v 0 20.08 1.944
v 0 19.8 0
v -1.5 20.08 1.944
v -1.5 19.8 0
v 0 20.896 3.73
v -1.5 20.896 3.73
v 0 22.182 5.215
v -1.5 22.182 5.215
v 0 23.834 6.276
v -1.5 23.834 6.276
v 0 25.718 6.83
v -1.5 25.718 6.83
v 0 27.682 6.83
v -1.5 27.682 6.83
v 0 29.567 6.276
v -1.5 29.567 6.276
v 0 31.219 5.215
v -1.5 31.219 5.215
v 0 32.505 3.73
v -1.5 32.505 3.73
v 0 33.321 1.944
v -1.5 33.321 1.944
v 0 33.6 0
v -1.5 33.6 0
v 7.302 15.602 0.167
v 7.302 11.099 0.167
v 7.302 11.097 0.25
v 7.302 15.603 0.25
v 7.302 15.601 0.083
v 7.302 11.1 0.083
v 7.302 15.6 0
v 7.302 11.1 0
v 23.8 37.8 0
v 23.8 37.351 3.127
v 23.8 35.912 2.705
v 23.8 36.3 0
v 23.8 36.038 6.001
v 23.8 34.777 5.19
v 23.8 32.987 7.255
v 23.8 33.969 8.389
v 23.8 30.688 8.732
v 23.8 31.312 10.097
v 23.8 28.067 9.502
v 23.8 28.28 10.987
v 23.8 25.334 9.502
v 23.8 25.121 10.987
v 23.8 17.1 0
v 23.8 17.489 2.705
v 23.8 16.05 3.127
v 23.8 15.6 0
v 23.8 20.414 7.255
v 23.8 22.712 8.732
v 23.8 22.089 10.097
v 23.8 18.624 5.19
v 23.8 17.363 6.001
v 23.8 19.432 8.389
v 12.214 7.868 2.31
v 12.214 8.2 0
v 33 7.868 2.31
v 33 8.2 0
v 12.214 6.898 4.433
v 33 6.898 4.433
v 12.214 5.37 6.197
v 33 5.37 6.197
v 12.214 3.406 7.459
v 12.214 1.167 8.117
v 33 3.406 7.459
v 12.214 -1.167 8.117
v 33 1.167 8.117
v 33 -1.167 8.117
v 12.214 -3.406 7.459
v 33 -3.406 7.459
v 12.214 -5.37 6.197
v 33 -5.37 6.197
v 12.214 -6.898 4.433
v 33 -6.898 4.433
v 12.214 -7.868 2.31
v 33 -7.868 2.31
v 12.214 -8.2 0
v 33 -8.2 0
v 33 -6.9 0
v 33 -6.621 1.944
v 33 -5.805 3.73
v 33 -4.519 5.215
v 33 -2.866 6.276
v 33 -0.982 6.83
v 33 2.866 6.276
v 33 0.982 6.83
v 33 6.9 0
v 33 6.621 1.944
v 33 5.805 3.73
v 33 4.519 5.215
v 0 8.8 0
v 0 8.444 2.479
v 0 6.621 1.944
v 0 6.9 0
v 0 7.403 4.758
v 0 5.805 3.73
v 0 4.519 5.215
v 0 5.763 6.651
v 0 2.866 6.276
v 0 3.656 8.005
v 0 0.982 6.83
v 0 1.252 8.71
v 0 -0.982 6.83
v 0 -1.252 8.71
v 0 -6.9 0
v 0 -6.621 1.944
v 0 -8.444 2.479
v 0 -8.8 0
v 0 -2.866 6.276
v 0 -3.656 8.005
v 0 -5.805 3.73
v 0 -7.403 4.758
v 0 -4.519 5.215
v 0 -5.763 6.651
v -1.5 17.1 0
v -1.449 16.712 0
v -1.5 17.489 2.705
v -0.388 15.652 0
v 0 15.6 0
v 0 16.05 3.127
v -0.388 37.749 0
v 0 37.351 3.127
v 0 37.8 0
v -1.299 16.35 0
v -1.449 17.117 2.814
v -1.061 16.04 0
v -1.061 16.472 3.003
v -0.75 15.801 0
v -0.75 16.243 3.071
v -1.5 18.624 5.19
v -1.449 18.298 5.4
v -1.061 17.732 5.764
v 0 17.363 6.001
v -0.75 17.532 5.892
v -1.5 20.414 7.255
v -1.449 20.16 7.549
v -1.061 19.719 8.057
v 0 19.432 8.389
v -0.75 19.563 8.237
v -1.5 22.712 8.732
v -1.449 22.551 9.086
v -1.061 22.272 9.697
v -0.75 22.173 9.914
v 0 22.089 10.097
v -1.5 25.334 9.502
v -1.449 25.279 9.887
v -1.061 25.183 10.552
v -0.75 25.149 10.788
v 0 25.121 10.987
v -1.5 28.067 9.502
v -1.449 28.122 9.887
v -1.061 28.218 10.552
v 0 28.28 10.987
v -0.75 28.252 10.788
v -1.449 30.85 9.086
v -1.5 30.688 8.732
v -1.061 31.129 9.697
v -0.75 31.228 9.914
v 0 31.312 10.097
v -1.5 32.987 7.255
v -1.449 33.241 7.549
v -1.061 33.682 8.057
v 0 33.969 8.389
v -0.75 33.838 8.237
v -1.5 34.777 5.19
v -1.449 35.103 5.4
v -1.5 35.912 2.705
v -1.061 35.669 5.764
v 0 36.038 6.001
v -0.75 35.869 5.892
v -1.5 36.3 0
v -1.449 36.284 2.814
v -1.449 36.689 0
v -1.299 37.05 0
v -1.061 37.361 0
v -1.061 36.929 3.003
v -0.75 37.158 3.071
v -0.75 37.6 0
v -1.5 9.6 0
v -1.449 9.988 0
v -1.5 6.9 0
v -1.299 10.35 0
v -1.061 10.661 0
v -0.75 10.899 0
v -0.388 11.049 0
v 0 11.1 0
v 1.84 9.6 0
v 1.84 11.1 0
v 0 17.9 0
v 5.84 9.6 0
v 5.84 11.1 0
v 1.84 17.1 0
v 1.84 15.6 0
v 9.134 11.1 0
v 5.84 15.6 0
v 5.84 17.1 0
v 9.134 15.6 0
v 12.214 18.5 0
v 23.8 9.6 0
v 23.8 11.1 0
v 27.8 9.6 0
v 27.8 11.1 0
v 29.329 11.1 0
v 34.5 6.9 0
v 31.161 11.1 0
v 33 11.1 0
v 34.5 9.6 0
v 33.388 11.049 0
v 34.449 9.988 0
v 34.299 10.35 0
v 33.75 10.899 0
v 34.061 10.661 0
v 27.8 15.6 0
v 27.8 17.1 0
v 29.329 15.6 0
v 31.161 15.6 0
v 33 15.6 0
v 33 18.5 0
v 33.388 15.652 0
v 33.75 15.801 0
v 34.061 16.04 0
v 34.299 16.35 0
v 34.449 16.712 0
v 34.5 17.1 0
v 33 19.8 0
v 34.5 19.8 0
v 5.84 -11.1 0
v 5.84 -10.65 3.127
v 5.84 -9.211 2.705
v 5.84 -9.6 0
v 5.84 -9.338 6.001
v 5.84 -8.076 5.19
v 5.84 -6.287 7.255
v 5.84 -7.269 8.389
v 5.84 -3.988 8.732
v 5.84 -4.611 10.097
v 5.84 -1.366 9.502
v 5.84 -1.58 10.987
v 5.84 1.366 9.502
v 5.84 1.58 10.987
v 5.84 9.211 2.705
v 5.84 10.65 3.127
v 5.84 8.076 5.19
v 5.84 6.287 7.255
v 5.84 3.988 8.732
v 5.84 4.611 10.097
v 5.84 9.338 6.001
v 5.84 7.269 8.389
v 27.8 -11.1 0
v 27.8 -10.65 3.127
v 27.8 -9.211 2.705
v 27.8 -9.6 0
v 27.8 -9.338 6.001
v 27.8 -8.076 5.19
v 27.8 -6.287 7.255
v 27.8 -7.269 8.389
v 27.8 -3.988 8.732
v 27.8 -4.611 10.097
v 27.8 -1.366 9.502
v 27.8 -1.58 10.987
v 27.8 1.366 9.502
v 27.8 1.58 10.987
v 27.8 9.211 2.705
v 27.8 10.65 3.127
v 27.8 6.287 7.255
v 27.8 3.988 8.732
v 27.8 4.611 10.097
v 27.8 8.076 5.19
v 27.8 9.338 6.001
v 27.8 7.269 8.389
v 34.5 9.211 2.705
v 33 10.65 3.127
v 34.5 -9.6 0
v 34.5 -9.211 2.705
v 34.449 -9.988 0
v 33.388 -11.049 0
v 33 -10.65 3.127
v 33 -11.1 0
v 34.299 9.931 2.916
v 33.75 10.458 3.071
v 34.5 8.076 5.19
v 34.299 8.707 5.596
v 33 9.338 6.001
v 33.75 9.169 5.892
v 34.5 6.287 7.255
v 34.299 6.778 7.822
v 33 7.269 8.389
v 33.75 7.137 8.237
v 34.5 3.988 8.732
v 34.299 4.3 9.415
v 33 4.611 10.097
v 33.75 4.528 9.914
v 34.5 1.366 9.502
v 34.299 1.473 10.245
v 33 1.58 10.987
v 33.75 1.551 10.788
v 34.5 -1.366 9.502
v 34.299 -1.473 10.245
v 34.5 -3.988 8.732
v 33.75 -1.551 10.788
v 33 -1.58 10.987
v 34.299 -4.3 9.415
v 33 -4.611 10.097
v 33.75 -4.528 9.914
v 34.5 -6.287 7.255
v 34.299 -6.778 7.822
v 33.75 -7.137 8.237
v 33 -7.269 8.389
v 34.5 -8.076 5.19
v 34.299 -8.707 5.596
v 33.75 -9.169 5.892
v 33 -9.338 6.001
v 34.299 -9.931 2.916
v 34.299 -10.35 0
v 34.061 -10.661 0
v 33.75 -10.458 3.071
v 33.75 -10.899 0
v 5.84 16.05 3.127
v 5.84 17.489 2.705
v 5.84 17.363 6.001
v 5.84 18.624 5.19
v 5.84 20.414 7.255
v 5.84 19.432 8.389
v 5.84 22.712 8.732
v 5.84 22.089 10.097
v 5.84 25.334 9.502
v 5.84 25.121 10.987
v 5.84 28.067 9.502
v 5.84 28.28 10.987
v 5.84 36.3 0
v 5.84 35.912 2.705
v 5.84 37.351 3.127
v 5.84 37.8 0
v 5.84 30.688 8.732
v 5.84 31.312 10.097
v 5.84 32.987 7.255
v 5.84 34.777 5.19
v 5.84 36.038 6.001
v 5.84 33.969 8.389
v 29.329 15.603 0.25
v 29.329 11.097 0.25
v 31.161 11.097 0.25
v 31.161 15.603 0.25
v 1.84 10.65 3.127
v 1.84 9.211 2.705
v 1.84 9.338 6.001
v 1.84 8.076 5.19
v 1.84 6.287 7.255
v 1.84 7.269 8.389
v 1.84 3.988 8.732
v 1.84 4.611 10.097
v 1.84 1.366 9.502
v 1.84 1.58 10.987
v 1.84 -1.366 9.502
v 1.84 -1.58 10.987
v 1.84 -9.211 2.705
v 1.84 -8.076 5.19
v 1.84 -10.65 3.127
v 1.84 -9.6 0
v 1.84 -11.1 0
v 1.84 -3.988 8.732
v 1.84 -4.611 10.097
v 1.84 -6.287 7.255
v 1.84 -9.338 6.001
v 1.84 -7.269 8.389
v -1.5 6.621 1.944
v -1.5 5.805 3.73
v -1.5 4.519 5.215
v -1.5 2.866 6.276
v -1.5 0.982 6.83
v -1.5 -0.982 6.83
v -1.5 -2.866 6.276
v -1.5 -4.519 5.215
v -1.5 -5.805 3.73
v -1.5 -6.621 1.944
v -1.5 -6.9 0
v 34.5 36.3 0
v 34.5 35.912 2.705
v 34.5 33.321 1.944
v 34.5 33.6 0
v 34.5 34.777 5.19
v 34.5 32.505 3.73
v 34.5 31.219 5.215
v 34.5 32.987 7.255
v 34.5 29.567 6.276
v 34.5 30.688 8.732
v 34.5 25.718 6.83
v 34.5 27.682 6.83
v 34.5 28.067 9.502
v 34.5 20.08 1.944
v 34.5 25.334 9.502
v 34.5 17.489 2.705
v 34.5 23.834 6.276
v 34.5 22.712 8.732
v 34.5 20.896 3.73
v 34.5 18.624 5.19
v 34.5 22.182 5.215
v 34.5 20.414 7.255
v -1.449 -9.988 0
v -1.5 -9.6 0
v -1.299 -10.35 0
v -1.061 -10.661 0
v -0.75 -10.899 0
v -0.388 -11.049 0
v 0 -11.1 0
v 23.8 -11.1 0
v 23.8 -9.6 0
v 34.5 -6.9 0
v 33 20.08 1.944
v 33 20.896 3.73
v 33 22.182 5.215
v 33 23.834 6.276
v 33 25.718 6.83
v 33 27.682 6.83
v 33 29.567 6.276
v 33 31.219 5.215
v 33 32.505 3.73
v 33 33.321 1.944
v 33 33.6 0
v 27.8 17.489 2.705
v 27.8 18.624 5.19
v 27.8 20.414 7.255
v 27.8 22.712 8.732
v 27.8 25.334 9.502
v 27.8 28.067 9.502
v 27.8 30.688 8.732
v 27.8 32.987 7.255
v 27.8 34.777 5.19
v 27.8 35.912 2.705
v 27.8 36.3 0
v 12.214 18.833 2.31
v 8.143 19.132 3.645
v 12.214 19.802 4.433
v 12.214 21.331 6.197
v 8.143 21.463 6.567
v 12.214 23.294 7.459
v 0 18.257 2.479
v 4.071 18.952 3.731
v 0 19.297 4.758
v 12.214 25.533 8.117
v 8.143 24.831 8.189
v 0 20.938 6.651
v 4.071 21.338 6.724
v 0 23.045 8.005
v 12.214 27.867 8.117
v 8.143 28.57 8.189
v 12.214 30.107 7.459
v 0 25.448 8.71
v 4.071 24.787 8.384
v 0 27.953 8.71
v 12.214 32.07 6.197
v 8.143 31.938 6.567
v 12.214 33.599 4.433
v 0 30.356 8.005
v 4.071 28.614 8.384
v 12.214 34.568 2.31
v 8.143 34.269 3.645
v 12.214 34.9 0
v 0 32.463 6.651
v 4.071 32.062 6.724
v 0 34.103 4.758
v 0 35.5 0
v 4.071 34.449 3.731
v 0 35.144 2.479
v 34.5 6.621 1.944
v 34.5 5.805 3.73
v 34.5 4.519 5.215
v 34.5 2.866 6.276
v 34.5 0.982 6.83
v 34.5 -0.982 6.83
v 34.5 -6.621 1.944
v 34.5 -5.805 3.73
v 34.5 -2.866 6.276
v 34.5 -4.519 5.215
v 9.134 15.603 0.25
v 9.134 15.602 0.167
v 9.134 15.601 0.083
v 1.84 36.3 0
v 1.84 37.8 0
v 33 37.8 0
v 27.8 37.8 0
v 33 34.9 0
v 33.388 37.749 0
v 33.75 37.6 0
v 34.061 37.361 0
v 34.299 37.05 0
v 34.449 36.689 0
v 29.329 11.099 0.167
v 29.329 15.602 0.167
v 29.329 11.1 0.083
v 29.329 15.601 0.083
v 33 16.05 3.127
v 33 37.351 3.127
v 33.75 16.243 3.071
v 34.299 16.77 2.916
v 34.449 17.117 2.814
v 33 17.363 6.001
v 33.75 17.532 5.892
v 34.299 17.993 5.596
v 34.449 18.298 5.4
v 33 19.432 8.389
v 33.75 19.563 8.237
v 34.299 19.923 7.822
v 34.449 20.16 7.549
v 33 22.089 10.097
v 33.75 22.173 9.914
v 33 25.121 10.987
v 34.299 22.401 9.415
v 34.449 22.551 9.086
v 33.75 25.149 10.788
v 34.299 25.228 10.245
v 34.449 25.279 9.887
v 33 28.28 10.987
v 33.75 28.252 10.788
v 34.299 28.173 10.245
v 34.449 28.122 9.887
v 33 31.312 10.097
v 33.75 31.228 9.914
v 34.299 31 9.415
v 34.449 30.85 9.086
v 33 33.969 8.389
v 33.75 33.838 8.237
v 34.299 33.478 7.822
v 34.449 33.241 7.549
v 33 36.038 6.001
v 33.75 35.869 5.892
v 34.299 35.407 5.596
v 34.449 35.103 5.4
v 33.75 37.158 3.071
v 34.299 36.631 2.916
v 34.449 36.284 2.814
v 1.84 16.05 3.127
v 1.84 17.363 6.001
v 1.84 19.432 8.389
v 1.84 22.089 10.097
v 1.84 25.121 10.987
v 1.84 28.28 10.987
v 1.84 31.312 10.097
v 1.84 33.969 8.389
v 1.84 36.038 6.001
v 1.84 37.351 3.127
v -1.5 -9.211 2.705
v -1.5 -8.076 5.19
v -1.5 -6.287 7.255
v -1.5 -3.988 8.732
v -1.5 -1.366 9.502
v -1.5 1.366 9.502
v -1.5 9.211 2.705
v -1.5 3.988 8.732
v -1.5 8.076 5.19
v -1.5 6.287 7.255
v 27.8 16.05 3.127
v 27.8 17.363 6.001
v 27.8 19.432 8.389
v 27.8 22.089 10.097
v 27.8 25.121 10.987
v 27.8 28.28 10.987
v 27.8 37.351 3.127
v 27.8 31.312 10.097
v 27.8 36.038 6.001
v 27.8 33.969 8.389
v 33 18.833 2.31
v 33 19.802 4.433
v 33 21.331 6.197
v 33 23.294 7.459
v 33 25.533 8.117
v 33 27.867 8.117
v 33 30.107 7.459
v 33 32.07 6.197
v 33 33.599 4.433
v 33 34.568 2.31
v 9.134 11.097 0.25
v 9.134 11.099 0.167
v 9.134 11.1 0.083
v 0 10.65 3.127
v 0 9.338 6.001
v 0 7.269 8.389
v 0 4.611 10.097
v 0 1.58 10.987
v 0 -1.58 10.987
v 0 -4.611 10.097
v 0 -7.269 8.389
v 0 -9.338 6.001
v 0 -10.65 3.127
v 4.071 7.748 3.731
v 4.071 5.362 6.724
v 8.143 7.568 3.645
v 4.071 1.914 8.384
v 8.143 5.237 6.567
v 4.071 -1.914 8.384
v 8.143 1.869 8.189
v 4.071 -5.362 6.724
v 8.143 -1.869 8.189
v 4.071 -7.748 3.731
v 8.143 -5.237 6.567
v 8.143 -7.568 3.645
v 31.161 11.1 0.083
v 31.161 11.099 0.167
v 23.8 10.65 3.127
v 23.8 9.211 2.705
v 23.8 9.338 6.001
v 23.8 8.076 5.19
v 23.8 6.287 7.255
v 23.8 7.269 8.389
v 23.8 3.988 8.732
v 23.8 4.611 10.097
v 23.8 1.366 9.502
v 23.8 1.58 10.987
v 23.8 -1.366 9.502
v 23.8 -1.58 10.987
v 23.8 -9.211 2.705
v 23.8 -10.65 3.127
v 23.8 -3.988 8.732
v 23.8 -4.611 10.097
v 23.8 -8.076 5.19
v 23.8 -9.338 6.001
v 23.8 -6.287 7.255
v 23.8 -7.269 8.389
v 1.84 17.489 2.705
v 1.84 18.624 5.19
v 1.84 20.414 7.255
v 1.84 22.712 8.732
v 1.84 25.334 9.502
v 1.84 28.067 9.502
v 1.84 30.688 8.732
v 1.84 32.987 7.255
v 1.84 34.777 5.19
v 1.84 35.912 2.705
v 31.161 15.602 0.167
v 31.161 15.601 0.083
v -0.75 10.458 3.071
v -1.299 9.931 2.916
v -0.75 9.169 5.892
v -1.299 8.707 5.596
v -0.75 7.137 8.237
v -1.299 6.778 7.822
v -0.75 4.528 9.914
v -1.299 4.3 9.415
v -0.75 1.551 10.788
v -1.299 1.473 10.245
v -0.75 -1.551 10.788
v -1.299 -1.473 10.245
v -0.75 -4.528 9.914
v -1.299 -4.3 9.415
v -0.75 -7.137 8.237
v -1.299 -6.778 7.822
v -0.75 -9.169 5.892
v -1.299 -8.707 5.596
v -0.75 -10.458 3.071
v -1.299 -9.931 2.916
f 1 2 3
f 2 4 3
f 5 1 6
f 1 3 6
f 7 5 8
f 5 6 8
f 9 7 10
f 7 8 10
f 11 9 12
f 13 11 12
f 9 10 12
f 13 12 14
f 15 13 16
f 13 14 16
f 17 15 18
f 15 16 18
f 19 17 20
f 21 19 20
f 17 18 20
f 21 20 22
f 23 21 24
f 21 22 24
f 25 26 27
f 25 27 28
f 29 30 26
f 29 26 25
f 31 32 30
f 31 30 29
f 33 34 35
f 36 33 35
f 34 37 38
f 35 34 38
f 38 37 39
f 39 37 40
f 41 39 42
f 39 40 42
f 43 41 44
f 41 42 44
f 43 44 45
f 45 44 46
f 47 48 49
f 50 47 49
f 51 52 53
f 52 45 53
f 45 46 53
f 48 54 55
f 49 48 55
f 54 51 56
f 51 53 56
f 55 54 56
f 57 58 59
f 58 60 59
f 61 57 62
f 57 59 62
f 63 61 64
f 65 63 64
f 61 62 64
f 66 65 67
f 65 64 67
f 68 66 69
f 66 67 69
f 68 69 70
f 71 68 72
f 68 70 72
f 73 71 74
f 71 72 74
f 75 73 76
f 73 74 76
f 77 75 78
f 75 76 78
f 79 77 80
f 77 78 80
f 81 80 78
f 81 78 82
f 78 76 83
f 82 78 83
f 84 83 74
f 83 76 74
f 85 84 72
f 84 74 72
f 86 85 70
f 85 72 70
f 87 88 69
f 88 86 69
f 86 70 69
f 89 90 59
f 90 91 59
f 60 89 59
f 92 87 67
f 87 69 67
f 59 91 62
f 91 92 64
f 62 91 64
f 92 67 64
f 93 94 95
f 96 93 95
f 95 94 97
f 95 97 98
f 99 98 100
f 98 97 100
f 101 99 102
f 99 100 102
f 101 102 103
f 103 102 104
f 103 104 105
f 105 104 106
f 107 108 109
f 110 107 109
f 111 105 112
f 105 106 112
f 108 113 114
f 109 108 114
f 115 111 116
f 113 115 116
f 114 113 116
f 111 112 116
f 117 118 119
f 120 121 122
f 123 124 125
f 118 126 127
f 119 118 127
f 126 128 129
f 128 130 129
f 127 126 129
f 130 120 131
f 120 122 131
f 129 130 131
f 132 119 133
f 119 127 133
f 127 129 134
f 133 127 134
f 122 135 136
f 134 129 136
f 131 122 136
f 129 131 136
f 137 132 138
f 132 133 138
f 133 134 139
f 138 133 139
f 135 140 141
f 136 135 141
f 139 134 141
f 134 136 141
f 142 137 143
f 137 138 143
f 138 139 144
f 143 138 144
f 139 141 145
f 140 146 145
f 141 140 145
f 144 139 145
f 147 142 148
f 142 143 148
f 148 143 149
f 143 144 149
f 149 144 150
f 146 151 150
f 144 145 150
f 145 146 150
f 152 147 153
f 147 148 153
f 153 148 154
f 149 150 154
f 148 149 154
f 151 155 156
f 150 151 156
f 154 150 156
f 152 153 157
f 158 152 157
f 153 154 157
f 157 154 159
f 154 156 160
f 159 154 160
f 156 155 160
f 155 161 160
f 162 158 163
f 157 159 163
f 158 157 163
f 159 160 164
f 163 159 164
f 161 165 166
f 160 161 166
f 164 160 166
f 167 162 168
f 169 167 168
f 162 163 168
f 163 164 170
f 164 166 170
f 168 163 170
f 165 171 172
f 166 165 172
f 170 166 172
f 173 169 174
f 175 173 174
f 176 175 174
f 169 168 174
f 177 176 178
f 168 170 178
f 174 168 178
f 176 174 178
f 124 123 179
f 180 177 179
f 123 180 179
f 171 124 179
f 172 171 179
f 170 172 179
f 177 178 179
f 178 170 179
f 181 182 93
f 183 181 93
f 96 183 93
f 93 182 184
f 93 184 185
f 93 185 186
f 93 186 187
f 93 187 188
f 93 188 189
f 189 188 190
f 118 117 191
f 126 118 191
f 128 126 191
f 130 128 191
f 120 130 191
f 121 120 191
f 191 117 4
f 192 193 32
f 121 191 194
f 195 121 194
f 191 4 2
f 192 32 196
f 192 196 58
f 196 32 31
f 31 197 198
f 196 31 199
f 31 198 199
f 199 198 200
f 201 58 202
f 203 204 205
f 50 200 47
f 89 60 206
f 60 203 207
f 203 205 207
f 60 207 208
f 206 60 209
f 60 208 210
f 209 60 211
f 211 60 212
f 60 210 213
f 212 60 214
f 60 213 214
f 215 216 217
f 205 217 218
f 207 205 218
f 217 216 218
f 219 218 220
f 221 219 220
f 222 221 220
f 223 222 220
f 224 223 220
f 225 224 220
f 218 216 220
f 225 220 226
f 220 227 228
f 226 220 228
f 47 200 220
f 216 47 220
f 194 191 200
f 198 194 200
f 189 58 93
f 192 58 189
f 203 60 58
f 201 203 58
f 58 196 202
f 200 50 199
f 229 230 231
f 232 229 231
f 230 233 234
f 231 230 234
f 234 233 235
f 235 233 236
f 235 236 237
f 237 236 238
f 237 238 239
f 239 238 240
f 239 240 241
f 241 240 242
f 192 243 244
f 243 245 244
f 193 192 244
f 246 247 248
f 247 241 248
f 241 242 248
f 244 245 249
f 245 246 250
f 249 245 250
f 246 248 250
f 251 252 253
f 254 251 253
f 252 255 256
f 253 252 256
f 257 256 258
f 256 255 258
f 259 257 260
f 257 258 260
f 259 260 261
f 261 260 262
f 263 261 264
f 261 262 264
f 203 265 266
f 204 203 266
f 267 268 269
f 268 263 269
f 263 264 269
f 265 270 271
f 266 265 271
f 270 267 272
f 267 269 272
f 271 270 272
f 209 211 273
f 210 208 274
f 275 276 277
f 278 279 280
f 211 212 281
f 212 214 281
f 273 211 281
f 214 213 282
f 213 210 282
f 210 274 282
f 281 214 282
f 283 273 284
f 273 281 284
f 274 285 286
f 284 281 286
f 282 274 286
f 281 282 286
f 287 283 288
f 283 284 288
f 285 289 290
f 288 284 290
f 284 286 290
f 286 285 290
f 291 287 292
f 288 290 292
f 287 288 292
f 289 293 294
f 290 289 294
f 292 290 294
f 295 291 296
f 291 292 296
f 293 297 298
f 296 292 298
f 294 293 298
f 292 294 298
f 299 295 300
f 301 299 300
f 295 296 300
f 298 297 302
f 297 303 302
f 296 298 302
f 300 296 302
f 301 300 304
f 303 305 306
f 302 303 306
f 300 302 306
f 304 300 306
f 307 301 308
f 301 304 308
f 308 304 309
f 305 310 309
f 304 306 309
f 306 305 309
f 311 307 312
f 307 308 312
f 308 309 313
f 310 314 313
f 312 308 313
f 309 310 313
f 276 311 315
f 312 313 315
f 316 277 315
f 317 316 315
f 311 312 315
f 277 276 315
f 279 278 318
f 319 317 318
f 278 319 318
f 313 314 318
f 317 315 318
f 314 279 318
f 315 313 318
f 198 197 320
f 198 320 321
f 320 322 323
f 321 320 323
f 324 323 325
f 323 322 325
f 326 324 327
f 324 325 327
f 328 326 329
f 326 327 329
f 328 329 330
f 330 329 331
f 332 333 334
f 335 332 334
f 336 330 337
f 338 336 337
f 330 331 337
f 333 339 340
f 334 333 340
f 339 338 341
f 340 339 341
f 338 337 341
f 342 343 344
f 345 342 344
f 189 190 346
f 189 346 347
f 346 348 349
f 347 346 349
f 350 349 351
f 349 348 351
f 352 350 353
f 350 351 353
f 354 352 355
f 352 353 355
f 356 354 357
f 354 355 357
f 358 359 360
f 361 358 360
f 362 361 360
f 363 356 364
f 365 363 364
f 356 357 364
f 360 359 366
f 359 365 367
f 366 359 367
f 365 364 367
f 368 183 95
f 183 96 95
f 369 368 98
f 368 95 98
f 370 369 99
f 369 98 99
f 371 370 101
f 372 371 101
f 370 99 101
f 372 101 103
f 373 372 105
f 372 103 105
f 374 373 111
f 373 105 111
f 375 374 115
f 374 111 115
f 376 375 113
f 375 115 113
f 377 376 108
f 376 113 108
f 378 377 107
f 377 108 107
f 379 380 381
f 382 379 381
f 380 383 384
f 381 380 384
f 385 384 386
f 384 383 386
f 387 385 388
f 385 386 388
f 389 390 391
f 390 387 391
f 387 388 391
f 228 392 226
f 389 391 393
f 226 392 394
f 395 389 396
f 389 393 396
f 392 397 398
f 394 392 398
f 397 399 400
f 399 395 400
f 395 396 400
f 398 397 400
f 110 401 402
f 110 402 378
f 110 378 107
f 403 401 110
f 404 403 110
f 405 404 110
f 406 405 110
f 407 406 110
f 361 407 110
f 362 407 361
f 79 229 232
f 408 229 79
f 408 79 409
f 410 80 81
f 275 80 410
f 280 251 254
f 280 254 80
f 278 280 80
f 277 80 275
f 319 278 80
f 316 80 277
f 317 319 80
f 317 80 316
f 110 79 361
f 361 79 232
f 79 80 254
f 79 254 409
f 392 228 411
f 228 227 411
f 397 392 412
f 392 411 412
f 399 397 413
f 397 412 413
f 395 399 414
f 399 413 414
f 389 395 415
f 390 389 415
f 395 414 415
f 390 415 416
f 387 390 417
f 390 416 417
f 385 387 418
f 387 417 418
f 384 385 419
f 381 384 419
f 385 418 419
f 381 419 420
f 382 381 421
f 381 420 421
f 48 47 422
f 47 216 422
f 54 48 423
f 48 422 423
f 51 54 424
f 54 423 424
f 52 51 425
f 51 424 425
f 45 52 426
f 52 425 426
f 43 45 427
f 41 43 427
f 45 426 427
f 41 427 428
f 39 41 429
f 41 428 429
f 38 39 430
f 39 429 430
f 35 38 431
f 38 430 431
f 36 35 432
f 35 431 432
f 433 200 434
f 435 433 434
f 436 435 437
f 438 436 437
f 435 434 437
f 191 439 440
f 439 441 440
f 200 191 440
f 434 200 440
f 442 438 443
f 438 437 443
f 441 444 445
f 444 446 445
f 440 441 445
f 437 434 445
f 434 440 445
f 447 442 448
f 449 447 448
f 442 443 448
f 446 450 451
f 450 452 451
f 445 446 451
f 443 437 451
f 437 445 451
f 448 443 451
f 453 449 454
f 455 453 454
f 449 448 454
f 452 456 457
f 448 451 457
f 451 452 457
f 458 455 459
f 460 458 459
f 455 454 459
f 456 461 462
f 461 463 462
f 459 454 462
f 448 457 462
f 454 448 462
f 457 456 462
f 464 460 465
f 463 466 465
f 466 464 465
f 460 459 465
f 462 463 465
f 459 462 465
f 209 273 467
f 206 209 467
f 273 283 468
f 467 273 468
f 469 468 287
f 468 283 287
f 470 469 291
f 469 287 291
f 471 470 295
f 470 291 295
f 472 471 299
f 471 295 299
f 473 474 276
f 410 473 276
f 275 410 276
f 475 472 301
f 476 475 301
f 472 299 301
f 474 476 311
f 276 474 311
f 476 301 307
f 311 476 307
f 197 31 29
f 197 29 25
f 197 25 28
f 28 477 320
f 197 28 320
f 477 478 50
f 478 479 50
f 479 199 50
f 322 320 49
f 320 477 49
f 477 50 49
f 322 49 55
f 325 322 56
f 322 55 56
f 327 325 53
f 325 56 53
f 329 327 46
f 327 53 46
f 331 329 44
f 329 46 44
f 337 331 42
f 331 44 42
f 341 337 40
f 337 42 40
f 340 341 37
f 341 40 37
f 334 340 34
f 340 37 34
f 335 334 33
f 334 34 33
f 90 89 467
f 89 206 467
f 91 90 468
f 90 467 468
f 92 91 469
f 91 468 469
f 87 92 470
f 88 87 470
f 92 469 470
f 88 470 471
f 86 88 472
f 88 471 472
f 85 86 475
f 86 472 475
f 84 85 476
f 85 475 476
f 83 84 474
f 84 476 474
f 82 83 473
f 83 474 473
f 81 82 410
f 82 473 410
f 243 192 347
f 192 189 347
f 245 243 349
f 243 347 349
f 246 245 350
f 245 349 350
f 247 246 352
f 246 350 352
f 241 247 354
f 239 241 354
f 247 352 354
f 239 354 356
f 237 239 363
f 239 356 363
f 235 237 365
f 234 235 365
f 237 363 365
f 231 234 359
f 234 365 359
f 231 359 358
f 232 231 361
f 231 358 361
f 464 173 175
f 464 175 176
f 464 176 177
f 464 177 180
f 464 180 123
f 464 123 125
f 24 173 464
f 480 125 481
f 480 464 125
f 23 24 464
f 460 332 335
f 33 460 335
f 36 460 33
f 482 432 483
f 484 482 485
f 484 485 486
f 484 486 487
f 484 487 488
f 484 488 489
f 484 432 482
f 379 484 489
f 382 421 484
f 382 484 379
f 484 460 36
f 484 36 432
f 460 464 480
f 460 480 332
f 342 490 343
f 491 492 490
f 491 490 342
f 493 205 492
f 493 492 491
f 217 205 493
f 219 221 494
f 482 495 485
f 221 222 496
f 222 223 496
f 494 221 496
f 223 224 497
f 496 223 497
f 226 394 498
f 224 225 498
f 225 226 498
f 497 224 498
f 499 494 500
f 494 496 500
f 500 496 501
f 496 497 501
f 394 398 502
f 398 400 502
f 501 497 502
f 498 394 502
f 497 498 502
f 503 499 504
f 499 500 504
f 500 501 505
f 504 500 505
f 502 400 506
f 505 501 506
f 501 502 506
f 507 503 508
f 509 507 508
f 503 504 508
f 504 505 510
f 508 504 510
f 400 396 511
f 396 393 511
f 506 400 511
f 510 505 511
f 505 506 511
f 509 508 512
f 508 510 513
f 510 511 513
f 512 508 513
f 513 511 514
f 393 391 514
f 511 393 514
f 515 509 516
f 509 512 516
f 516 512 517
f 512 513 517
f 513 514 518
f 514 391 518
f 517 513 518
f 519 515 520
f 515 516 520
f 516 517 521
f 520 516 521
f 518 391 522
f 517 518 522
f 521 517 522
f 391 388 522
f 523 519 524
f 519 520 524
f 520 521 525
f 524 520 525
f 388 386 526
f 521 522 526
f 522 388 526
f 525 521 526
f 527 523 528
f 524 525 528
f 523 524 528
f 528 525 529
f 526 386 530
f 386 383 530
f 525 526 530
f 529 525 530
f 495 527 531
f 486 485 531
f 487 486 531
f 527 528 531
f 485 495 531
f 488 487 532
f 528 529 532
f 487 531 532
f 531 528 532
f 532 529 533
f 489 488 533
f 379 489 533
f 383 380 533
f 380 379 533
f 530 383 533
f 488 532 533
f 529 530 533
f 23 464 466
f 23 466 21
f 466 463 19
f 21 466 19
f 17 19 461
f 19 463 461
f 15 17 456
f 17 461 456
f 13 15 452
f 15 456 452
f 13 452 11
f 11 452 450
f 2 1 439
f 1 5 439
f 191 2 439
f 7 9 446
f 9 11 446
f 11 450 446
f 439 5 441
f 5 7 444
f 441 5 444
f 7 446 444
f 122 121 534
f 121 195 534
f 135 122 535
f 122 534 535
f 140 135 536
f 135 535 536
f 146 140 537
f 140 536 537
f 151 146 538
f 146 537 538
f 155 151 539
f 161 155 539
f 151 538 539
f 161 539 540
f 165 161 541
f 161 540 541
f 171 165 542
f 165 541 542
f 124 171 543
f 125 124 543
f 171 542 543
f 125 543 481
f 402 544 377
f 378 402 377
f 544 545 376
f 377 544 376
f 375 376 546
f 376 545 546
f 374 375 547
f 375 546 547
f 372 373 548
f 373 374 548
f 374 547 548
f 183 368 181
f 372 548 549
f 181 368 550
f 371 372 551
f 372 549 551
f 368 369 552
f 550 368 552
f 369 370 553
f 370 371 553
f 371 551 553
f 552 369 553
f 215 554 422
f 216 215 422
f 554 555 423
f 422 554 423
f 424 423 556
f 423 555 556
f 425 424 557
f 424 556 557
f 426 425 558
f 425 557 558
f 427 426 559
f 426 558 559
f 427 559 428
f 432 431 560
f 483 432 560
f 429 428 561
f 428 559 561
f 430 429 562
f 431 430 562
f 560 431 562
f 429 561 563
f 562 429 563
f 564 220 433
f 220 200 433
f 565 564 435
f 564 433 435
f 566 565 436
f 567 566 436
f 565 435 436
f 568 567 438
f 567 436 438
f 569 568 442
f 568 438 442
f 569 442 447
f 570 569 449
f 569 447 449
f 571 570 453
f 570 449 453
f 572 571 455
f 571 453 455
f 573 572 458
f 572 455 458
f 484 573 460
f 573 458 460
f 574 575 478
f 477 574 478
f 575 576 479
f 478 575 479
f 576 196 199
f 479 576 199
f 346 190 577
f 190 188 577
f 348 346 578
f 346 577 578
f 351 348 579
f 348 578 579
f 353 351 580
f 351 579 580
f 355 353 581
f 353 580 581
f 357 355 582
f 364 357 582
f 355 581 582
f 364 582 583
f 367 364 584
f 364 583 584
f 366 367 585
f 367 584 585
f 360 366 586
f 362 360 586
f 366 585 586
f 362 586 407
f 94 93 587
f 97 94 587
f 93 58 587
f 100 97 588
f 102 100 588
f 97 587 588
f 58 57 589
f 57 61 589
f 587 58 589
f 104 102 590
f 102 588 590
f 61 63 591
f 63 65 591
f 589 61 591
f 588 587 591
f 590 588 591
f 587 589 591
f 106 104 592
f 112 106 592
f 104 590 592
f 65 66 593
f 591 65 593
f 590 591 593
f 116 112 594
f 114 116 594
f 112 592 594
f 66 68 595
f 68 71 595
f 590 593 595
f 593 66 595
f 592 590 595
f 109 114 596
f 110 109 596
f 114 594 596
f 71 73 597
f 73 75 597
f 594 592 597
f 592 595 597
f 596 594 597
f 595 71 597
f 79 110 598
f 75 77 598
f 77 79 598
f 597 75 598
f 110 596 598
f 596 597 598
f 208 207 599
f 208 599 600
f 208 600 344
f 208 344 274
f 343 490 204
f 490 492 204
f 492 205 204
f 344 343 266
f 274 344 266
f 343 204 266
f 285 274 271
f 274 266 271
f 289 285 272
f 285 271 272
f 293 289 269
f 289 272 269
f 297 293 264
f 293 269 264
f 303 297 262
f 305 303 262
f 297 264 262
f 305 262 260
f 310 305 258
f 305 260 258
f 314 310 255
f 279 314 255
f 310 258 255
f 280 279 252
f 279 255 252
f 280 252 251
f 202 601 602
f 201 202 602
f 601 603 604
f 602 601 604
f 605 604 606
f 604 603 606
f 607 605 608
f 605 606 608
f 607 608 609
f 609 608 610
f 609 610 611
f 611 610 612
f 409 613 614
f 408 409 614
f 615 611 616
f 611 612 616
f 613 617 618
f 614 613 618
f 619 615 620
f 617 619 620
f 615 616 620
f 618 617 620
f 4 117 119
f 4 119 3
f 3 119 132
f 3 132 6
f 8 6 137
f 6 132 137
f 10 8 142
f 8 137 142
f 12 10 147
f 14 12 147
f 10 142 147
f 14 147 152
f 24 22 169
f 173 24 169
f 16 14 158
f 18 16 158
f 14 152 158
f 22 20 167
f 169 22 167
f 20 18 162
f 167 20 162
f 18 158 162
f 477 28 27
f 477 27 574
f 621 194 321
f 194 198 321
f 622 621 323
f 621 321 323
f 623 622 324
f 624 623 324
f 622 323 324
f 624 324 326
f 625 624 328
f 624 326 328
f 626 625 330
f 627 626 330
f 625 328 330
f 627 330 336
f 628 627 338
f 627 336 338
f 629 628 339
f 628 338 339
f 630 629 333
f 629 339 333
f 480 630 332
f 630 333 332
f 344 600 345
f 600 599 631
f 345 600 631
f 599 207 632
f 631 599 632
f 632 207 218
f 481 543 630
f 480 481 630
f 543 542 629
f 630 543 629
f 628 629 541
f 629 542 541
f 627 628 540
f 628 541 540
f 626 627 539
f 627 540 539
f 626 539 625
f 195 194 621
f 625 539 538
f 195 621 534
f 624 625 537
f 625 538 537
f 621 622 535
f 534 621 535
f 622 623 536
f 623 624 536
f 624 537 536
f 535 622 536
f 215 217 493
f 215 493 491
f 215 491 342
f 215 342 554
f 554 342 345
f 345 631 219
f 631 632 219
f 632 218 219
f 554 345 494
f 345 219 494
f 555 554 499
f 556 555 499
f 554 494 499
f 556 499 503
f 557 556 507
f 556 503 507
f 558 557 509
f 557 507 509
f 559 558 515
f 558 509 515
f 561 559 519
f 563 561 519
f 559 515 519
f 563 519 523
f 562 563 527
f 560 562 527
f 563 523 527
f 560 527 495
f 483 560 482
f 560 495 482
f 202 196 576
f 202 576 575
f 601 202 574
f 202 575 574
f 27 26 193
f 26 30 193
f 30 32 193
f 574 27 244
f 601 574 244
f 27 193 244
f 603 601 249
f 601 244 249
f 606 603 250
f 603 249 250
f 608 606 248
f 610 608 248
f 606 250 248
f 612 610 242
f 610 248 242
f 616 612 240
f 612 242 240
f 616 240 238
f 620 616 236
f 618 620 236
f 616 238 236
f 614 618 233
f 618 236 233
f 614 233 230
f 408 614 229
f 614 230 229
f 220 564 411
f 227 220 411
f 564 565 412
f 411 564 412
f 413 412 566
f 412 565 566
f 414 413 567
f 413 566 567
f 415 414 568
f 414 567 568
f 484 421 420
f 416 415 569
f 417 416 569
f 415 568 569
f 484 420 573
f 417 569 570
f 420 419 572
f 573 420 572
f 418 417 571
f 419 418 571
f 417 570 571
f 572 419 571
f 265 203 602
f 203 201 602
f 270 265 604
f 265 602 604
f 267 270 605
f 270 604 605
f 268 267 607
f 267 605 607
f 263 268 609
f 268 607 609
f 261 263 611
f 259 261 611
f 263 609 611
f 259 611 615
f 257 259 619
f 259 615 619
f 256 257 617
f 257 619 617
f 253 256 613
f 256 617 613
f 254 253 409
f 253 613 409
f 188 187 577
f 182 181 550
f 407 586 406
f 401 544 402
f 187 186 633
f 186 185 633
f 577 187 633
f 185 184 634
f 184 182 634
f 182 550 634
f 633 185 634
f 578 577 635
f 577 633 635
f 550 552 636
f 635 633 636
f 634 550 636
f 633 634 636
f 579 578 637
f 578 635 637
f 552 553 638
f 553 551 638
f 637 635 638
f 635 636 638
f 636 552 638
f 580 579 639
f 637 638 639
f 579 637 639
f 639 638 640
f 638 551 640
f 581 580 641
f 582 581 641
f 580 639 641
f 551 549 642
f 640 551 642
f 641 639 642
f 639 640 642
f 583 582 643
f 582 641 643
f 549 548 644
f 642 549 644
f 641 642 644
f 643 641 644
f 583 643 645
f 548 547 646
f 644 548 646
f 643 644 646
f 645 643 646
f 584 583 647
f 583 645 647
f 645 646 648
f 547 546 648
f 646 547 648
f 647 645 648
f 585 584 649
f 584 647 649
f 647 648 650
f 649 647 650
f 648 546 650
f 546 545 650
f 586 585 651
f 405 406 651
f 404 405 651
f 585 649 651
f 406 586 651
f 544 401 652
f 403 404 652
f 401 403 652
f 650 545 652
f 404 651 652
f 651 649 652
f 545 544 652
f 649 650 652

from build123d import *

# Parameters (mm, degrees)
F2_ANGLE = 180
F3_ANGLE = 180
F1_W     = 1.8325150013
F1_H     = 5.3774006665
F1_W_2   = 1.83251407
F1_H_2   = 5.3300224245
F4_DEPTH = 0.25


# Not quite as in the source:
# - ends of sketch curves that miss each other by under 0.0002 mm in the source are joined
# - a feature names something its author has since deleted; it is built from what else it names


with BuildPart() as f2:
    # F0 (on Top) → F2 (revolve)
    with BuildSketch(Plane.XY):
        with BuildLine():
            Line((34.5, 8.2), (34.5, 9.6))
            ThreePointArc((34.5, 9.6), (34.0606601718, 10.6606601718), (33, 11.1))
            Line((33, 11.1), (27.8003929108, 11.1000006409))
            Line((27.8003929108, 11.1000006409), (27.8003929108, 9.600000456))
            Line((27.8003929108, 9.600000456), (23.8003929108, 9.600000456))
            Line((23.8003929108, 9.600000456), (23.8003929108, 11.100000456))
            Line((23.8003929108, 11.100000456), (5.8400444046, 11.0999997705))
            Line((5.8400444046, 11.0999997705), (5.8400444046, 9.6))
            Line((5.8400444046, 9.6), (1.8400444046, 9.6))
            Line((1.8400444046, 9.6), (1.8400444046, 11.1))
            Line((1.8400444046, 11.1), (0, 11.1))
            ThreePointArc((0, 11.1), (-1.0606601718, 10.6606601718), (-1.5, 9.6))
            Line((-1.5, 9.6), (-1.5, 6.9))
            Line((-1.5, 6.9), (0, 6.9))
            Line((0, 6.9), (0, 8.8))
            Line((0, 8.8), (12.2141037136, 8.2))
            Line((12.2141037136, 8.2), (33, 8.2))
            Line((33, 8.2), (33, 6.9))
            Line((33, 6.9), (34.5, 6.9))
            Line((34.5, 6.9), (34.5, 8.2))
        make_face()
    revolve(axis=Axis((17.25, 0, 0), (1, 0, 0)), revolution_arc=F2_ANGLE)



with BuildPart() as f3:
    # F0 (on Top) → F3 (revolve)
    with BuildSketch(Plane.XY):
        with BuildLine():
            Line((34.5, 17.1004687339), (34.5, 18.5004687339))
            Line((34.5, 18.5004687339), (34.5, 19.8004687339))
            Line((34.5, 19.8004687339), (33, 19.8004687339))
            Line((33, 19.8004687339), (33, 18.5004687339))
            Line((33, 18.5004687339), (12.2141037136, 18.5004687339))
            Line((12.2141037136, 18.5004687339), (0, 17.9004687339))
            Line((0, 17.9004687339), (0, 19.8004687339))
            Line((0, 19.8004687339), (-1.5, 19.8004687339))
            Line((-1.5, 19.8004687339), (-1.5, 17.1004687339))
            ThreePointArc((-1.5, 17.1004687339), (-1.0606601718, 16.0398085621), (0, 15.6004687339))
            Line((0, 15.6004687339), (1.8400444046, 15.6004687339))
            Line((1.8400444046, 15.6004687339), (1.8400444046, 17.1004687339))
            Line((1.8400444046, 17.1004687339), (5.8400444046, 17.1004687339))
            Line((5.8400444046, 17.1004687339), (5.8400444046, 15.6004687339))
            Line((5.8400444046, 15.6004687339), (23.8003929108, 15.6004682779))
            Line((23.8003929108, 15.6004682779), (23.8003929108, 17.1004682779))
            Line((23.8003929108, 17.1004682779), (27.8003929108, 17.1004682779))
            Line((27.8003929108, 17.1004682779), (27.8003929108, 15.6004680931))
            Line((27.8003929108, 15.6004680931), (33, 15.6004687339))
            ThreePointArc((33, 15.6004687339), (34.0606601718, 16.0398085621), (34.5, 17.1004687339))
        make_face()
    revolve(axis=Axis((17.25, 26.7004687339, 0), (-1, 0, 0)), revolution_arc=F3_ANGLE)


with BuildPart() as f2_1:
    add(f2.part)

    add(f3.part)  # F4 merges F3
    # F1 (on Top) → F4 (join)
    with BuildSketch(Plane.XY):
        with Locations((30.2449278533, 13.3801726624)):
            Rectangle(F1_W, F1_H)
        with Locations((8.218171075, 13.3564835414)):
            Rectangle(F1_W_2, F1_H_2)
    extrude(amount=F4_DEPTH)


solid = f2_1.part
